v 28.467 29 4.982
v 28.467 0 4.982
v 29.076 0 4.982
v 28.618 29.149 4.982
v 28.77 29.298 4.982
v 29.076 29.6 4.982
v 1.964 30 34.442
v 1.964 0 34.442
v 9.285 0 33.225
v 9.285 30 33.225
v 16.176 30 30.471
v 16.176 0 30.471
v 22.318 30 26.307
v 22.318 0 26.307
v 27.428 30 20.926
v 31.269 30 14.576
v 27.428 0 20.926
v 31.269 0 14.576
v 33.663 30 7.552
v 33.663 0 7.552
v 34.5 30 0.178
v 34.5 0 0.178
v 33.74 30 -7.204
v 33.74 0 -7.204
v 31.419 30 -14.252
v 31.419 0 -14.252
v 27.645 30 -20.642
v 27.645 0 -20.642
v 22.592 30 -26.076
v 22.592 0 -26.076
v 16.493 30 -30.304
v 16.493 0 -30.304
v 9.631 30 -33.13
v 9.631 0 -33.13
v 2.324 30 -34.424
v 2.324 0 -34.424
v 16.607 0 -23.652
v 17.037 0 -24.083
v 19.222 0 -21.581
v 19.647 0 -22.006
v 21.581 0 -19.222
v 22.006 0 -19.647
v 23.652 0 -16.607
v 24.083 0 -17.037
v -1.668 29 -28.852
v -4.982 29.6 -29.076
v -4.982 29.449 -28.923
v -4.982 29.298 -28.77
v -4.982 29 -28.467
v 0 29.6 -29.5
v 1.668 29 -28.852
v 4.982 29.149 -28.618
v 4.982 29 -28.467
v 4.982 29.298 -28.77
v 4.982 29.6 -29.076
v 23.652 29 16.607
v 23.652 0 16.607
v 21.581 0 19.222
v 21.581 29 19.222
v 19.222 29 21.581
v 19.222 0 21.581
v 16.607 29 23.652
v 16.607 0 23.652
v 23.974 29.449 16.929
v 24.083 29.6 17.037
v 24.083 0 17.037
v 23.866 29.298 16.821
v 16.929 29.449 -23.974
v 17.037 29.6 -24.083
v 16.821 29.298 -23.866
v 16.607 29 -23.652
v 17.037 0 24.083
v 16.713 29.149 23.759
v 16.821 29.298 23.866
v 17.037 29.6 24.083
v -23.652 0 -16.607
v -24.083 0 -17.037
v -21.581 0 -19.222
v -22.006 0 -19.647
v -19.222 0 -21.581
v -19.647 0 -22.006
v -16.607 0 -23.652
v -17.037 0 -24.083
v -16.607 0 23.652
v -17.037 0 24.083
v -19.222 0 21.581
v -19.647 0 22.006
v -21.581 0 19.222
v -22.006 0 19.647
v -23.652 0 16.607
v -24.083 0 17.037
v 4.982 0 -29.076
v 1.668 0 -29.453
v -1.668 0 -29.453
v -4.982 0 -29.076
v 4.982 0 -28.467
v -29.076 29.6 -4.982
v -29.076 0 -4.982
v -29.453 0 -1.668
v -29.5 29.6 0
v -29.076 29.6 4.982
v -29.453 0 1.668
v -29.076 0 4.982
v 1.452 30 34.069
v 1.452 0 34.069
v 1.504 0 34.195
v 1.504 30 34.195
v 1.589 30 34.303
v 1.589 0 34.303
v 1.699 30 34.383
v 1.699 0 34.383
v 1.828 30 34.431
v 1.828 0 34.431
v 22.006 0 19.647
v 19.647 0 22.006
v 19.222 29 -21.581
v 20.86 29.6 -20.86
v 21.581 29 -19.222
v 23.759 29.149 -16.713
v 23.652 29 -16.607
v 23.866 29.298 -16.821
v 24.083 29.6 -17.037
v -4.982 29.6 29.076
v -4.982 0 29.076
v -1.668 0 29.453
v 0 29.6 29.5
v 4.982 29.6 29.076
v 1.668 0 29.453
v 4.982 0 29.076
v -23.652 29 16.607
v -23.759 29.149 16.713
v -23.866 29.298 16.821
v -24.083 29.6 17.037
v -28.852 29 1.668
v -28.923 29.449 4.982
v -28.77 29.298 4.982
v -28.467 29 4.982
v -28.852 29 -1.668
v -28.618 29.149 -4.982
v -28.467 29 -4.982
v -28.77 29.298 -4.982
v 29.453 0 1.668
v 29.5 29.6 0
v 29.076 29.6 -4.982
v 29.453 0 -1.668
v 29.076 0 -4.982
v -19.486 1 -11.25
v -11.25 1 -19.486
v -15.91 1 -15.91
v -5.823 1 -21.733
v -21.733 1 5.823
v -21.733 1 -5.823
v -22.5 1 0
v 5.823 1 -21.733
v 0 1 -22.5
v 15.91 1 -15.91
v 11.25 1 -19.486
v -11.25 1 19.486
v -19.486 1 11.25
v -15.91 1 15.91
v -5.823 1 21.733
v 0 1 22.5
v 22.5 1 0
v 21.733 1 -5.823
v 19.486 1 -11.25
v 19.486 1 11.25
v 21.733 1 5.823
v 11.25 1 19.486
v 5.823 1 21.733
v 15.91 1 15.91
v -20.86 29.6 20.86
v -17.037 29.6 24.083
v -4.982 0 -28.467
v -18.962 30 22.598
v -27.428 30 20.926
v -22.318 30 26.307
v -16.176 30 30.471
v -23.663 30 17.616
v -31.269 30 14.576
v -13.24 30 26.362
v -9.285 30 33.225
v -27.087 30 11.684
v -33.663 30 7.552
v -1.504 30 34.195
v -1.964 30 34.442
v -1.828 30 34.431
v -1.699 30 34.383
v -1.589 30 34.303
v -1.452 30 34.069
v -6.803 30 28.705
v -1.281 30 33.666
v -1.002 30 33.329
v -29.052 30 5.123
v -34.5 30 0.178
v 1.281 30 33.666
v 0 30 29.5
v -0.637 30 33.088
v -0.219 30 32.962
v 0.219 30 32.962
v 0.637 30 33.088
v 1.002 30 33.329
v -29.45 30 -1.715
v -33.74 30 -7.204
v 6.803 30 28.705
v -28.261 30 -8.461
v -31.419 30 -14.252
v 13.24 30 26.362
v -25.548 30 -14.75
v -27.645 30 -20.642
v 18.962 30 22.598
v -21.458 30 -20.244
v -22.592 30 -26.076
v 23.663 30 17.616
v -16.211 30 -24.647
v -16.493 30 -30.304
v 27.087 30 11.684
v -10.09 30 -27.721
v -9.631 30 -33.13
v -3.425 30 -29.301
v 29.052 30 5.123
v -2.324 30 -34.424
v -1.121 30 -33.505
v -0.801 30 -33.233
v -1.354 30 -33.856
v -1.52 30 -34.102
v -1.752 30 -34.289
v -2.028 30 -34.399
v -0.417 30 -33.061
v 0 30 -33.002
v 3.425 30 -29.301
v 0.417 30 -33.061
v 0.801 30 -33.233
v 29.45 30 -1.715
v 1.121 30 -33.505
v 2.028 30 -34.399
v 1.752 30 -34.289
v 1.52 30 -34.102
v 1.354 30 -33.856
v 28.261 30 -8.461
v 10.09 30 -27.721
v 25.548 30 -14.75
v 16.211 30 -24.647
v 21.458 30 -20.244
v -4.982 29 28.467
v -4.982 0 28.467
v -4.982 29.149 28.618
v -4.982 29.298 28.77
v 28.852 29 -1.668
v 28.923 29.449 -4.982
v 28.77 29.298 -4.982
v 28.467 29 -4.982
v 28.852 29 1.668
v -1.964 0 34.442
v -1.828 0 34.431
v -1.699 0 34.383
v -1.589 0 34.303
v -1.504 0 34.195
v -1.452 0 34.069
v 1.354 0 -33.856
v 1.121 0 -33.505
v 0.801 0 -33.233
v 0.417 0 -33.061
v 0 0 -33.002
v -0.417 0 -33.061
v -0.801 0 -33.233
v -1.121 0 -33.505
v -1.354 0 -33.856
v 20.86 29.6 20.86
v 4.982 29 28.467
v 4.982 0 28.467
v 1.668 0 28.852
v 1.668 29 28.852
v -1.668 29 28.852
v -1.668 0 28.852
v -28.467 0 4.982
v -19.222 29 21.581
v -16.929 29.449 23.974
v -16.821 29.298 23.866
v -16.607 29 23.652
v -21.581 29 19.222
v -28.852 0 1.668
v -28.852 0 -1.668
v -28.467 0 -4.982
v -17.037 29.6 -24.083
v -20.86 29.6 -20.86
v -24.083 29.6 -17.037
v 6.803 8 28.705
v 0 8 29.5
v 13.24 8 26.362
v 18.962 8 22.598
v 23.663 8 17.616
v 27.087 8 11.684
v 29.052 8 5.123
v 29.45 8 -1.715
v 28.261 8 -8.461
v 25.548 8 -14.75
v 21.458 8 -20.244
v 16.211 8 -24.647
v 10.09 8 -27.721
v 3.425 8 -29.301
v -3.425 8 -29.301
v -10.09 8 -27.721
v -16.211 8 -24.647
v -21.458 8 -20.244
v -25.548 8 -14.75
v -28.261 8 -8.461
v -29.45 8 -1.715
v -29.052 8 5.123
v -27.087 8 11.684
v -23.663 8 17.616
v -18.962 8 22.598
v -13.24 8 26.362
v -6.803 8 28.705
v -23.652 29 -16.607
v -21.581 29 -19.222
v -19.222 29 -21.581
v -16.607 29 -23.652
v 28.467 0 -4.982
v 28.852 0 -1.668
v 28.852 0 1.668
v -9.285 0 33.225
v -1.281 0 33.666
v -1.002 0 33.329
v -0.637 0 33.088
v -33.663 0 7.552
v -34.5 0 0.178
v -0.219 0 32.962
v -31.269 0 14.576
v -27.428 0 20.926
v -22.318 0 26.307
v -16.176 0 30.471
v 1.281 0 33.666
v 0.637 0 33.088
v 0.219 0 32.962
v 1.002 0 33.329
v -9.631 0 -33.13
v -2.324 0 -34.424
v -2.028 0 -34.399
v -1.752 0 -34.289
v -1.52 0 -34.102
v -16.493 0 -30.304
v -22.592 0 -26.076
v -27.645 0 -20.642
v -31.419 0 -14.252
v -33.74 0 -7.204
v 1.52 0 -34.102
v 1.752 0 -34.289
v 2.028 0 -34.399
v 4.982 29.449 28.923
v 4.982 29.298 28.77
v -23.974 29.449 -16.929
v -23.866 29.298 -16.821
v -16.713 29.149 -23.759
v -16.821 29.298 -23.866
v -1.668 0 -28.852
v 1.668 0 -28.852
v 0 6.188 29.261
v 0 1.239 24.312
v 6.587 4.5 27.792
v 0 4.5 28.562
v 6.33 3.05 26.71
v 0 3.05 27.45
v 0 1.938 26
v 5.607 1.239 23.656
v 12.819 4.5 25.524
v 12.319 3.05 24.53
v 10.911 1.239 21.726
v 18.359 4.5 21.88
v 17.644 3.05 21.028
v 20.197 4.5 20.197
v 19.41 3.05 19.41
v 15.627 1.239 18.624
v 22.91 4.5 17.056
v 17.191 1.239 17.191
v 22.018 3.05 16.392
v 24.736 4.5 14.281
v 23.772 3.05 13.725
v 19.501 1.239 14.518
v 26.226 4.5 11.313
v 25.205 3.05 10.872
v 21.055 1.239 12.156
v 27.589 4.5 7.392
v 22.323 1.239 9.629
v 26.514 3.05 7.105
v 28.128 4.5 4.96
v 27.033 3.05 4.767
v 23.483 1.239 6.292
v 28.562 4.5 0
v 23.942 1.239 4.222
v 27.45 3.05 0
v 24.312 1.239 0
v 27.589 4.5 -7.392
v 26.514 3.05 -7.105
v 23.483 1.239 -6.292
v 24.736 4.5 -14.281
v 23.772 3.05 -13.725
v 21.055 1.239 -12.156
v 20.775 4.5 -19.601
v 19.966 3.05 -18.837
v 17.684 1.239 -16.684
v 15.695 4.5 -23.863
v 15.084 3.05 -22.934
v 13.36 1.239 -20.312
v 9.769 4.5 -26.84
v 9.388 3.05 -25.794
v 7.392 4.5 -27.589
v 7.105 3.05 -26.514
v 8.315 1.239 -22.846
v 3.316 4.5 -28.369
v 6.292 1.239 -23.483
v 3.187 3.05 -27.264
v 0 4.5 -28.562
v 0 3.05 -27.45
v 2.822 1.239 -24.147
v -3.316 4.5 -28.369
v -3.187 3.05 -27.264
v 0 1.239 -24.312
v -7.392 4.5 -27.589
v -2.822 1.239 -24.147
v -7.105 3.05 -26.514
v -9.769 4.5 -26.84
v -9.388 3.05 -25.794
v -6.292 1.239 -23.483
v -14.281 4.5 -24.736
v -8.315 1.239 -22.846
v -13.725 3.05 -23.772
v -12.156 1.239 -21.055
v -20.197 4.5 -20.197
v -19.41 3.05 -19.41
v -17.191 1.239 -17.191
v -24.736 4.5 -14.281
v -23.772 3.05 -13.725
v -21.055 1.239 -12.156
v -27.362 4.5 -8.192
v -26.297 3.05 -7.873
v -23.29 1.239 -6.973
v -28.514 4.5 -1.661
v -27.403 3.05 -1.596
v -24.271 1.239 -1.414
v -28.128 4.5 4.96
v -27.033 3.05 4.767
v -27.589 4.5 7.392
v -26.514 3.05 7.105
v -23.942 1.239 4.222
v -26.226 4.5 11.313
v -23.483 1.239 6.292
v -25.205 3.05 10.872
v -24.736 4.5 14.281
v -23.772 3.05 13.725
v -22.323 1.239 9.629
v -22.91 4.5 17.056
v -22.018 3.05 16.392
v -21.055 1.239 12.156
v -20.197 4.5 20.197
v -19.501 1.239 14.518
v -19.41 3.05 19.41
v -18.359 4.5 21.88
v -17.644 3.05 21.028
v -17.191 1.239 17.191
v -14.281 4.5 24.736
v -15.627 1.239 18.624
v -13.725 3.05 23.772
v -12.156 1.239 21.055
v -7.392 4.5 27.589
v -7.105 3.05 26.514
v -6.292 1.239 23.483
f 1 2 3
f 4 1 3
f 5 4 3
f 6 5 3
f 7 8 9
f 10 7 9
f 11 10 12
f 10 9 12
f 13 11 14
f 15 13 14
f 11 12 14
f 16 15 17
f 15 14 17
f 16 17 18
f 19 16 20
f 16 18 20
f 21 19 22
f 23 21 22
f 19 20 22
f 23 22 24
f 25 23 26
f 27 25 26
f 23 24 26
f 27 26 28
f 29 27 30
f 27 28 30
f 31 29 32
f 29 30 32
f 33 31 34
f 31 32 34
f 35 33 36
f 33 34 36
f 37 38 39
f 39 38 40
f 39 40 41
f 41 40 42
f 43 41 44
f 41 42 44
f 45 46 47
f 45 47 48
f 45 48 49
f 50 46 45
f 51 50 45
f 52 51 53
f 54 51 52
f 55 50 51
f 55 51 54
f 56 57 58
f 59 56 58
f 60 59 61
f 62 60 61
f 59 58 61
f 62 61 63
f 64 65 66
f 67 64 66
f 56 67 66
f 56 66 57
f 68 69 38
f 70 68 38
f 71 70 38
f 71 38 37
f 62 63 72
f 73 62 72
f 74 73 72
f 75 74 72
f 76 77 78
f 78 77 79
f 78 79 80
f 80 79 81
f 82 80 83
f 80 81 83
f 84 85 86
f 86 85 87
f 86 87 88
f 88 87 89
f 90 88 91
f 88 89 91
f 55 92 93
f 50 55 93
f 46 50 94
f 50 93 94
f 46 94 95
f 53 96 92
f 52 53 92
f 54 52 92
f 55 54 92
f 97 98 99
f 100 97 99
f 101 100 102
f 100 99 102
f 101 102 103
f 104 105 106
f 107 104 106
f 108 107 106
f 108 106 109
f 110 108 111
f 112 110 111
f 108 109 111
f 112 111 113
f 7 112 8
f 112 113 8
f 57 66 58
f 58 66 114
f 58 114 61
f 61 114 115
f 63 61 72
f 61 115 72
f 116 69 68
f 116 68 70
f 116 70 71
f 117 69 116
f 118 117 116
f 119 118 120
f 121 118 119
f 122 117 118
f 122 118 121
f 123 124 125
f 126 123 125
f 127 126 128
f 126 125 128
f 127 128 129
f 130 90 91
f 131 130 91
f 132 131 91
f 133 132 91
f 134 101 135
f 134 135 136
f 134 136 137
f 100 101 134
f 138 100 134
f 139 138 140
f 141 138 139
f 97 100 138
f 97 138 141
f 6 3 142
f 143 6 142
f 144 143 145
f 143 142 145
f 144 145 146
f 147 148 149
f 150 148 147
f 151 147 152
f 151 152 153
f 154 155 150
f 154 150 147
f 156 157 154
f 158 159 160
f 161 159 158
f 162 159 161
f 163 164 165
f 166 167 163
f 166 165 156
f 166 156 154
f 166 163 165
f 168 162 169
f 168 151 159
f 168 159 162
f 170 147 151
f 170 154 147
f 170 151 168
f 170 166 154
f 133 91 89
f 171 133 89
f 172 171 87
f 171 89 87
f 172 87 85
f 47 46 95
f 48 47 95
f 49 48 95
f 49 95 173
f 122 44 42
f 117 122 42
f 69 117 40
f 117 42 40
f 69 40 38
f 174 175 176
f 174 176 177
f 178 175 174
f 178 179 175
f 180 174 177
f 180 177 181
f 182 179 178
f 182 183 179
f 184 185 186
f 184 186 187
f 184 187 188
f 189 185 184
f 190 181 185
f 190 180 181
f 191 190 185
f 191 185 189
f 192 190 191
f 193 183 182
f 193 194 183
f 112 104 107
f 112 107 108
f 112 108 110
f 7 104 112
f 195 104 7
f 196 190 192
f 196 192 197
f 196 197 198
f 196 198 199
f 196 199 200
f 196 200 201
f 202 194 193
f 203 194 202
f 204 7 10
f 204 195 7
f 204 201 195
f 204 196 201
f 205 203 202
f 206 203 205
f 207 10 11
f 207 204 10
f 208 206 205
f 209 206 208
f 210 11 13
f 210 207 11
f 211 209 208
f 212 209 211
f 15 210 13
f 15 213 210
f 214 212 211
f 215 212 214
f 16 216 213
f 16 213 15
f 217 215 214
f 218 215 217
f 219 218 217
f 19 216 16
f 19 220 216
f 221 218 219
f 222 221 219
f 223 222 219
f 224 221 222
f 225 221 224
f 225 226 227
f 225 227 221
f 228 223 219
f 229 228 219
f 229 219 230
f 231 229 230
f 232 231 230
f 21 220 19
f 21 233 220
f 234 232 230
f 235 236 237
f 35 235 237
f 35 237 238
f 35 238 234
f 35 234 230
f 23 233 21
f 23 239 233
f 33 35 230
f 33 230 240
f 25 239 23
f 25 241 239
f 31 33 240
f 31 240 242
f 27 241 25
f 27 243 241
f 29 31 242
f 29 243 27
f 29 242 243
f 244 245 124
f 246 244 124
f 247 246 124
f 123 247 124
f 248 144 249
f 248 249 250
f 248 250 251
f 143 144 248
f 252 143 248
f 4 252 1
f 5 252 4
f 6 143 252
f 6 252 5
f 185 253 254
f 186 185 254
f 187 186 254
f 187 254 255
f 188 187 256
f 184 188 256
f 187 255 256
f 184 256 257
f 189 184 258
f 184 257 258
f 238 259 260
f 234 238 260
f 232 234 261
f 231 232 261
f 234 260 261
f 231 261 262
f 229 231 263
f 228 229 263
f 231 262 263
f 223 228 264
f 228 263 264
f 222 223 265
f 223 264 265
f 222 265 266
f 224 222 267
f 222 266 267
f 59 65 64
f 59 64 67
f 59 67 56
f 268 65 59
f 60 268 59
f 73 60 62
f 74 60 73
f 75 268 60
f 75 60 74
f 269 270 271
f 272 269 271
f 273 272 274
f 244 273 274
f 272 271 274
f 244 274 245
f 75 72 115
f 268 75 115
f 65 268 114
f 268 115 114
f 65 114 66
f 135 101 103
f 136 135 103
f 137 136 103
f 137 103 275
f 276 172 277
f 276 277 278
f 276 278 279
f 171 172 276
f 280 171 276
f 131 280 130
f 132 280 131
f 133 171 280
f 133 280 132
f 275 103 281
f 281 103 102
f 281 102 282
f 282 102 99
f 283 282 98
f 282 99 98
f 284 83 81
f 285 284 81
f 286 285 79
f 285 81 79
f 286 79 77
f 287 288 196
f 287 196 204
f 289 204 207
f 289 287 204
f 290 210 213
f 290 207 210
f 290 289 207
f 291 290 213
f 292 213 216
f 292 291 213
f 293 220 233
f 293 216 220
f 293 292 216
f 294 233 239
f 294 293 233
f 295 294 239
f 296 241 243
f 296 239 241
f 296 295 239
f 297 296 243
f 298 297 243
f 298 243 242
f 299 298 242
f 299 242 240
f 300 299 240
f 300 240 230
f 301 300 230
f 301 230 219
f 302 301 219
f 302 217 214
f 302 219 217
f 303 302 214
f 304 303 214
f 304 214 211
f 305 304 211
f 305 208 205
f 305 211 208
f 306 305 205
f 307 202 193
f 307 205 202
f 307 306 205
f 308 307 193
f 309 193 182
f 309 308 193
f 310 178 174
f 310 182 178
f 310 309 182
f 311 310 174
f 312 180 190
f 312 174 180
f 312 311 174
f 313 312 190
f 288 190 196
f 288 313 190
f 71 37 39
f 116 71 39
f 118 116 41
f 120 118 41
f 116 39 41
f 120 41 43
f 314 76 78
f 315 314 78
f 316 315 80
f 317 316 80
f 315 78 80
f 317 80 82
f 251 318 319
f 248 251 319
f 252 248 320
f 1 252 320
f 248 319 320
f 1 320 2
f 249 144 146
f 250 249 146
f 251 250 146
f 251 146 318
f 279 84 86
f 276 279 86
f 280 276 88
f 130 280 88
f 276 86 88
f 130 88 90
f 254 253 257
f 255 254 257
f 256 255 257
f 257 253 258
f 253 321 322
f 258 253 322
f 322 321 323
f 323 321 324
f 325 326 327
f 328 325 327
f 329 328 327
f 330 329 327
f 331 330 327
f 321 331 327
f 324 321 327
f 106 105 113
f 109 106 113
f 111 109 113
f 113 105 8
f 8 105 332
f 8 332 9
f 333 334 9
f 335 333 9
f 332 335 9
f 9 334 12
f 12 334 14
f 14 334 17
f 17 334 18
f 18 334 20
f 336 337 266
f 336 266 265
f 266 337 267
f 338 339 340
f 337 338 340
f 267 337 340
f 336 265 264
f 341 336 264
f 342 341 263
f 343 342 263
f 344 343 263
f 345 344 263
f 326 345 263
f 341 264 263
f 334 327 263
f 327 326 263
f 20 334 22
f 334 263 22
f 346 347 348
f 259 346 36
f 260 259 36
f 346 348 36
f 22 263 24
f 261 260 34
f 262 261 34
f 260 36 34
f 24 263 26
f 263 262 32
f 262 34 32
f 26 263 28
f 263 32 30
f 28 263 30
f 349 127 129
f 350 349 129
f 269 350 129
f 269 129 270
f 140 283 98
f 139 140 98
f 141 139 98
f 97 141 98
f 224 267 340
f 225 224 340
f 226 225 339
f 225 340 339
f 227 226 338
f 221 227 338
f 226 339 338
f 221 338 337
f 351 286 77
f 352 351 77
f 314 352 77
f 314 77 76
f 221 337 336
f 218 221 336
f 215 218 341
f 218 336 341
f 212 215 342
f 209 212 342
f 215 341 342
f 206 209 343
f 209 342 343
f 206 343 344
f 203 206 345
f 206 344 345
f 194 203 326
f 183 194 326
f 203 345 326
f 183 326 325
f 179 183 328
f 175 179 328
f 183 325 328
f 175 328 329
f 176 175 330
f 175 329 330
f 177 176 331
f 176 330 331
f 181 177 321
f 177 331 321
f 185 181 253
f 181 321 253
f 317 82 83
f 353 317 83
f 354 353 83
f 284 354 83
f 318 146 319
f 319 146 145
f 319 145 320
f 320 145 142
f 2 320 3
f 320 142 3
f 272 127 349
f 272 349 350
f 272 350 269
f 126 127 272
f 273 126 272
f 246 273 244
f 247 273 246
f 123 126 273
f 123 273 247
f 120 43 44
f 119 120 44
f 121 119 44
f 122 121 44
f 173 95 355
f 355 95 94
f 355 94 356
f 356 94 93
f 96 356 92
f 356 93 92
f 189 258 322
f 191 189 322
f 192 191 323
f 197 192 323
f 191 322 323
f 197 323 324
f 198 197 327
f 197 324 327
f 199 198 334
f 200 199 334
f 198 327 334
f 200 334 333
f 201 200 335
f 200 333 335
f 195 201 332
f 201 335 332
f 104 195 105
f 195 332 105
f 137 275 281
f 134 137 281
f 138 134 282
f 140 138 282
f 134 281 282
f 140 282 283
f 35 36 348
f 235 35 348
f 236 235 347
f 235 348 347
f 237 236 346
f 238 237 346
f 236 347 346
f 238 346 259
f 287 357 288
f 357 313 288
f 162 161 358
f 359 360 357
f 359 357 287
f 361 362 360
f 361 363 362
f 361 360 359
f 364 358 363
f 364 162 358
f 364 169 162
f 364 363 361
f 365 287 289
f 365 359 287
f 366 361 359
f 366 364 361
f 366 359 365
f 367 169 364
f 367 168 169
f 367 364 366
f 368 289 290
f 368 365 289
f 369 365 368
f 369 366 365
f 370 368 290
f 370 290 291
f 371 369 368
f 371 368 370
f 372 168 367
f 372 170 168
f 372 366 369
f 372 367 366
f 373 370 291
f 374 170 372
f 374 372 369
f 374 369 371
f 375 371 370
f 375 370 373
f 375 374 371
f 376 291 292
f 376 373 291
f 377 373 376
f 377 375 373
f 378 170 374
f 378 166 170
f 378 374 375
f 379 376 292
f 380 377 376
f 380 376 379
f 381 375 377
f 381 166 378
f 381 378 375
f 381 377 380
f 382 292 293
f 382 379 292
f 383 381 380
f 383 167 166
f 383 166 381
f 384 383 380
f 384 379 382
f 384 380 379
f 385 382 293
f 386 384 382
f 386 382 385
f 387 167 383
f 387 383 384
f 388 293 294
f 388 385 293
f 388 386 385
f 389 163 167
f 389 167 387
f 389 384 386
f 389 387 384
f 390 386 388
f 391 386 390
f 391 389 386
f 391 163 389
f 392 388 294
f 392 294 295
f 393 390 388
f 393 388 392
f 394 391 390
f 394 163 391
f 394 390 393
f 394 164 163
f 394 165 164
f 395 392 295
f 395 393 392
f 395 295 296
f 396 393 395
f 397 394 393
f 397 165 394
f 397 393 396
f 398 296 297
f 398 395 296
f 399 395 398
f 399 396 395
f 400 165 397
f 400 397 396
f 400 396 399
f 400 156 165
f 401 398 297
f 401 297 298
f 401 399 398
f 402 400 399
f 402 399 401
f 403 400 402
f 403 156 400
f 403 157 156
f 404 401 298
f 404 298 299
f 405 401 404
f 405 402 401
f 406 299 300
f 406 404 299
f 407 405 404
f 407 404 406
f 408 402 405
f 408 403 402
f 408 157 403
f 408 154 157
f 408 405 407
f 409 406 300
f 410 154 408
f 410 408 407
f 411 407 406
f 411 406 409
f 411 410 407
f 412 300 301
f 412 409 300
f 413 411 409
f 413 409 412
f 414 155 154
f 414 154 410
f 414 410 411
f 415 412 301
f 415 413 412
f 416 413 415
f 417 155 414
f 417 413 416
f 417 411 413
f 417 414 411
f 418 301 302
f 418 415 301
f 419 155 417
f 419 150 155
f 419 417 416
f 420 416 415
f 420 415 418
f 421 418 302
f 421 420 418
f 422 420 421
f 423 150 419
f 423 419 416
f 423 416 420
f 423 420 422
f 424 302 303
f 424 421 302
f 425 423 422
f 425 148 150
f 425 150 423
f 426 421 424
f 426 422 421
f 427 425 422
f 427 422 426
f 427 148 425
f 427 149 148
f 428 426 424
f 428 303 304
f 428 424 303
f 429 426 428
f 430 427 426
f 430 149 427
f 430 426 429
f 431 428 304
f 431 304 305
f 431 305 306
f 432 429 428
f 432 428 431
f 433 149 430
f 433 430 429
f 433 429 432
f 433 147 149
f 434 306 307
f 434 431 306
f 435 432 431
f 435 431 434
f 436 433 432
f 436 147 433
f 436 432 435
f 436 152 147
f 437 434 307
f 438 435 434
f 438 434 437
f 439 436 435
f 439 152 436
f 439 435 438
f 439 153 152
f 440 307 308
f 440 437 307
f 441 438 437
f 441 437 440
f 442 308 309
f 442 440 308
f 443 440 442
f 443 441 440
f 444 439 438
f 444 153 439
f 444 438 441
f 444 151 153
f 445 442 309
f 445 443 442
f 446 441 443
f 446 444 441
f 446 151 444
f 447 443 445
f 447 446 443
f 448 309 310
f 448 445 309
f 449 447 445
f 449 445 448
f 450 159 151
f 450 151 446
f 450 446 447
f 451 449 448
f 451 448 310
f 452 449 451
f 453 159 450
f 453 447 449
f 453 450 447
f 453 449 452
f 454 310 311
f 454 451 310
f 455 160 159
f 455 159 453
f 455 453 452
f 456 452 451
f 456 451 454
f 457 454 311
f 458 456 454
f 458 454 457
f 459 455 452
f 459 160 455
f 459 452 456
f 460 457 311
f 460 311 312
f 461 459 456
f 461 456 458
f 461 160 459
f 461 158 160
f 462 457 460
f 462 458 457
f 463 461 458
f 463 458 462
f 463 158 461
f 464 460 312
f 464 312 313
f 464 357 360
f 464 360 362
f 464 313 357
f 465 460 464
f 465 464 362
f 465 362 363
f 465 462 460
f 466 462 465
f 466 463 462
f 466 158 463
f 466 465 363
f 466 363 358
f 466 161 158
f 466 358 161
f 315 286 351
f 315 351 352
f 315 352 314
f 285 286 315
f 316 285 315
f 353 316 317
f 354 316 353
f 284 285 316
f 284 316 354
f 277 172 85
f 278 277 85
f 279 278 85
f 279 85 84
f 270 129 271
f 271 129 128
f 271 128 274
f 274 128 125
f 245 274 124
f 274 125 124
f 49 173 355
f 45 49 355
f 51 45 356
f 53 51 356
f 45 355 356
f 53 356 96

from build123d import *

# Parameters (mm, degrees)
BOSS_EXTRUDE1_DEPTH = 30
CUT_EXTRUDE2_REACH  = 60.241
CUT_EXTRUDE2_START  = 1
SKETCH2_R           = 29.5
BOSS_EXTRUDE2_DEPTH = 30
CHAMFER2_SIZE       = 1
CIRPATTERN2_COUNT   = 8
FILLET2_R           = 7


with BuildPart() as part:
    # Sketch1 → Boss-Extrude1 (new body)
    with BuildSketch(Plane(origin=(0, 0, 0), x_dir=(1, 0, 0), z_dir=(0, 1, 0))):
        with BuildLine():
            ThreePointArc((1.451818925, -34.068556857), (1.641248992, -34.346908706), (1.964225605, -34.442038138))
            ThreePointArc((1.964225605, -34.442038138), (34.499528846, -0.178302888), (2.324135821, 34.423627607))
            ThreePointArc((2.324135821, 34.423627607), (1.751838249, 34.289058819), (1.354061739, 33.856153382))
            ThreePointArc((1.354061739, 33.856153382), (0, 33.001534515), (-1.354061739, 33.856153382))
            ThreePointArc((-1.354061739, 33.856153382), (-1.751838249, 34.289058819), (-2.324135821, 34.423627607))
            ThreePointArc((-2.324135821, 34.423627607), (-34.499528846, -0.178302888), (-1.964225605, -34.442038138))
            ThreePointArc((-1.964225605, -34.442038138), (-1.641248992, -34.346908706), (-1.451818925, -34.068556857))
            ThreePointArc((-1.451818925, -34.068556857), (0, -32.945679925), (1.451818925, -34.068556857))
        make_face()
    extrude(amount=BOSS_EXTRUDE1_DEPTH)

    # Sketch2 → Cut-Extrude2 (cut, up to next)
    with BuildSketch(Plane(origin=(0, 0, 0), x_dir=(1, 0, 0), z_dir=(0, 1, 0)).offset(CUT_EXTRUDE2_START), mode=Mode.PRIVATE) as cut_extrude2_sk1:
        with Locations(Location((0, 0, 0), (0, 0, 270))):
            Circle(SKETCH2_R)
    cut_extrude2_tool1 = extrude(cut_extrude2_sk1.sketch, amount=CUT_EXTRUDE2_REACH, mode=Mode.PRIVATE) & part.part
    add(cut_extrude2_tool1.solids().sort_by_distance((0, 1, 0))[0], mode=Mode.SUBTRACT)

    # Fillet2
    fillet2_edges = [part.edges().sort_by_distance(p)[0] for p in [
        (0, 1, -29.5),
    ]]
    fillet(fillet2_edges, radius=FILLET2_R)


with BuildPart() as body_2:
    # Sketch2<2> → Boss-Extrude2 (new body)
    with BuildSketch(Plane(origin=(0, 0, 0), x_dir=(1, 0, 0), z_dir=(0, 1, 0))):
        with BuildLine():
            ThreePointArc((4.982013036, 29.076271186), (0, 29.5), (-4.982013036, 29.076271186))
            Line((-4.982013036, 29.076271186), (-4.982013036, 28.467341746))
            ThreePointArc((-4.982013036, 28.467341746), (0, 28.9), (4.982013036, 28.467341746))
            Line((4.982013036, 28.467341746), (4.982013036, 29.076271186))
        make_face()
    extrude(amount=BOSS_EXTRUDE2_DEPTH)

    # Chamfer2
    # the kernel refuses this chamfer: 1 mm, written as the material it takes off along each edge
    with BuildSketch(Plane(origin=(0, 30, 0), x_dir=(-0.25924534785409165, 0, -0.9658114979725655), z_dir=(-0.9658114979725655, 0, 0.25924534785409165))) as chamfer2_piece_1:
        Polygon((28.9, CHAMFER2_SIZE), (28.9 + CHAMFER2_SIZE, 0), (28.9, 0), align=None)
    revolve(axis=Axis((0, 30, 0), (0, -1, 0)), revolution_arc=30.050576955, mode=Mode.SUBTRACT)


with BuildPart() as cirpattern2_1:
    # CirPattern2: pattern copy
    add(body_2.part.rotate(Axis((0, 0, 0), (0, 1, 0)), 1 * 360 / CIRPATTERN2_COUNT))


with BuildPart() as cirpattern2_2:
    # CirPattern2: pattern copy
    add(body_2.part.rotate(Axis((0, 0, 0), (0, 1, 0)), 2 * 360 / CIRPATTERN2_COUNT))


with BuildPart() as cirpattern2_3:
    # CirPattern2: pattern copy
    add(body_2.part.rotate(Axis((0, 0, 0), (0, 1, 0)), 3 * 360 / CIRPATTERN2_COUNT))


with BuildPart() as cirpattern2_4:
    # CirPattern2: pattern copy
    add(body_2.part.rotate(Axis((0, 0, 0), (0, 1, 0)), 4 * 360 / CIRPATTERN2_COUNT))


with BuildPart() as cirpattern2_5:
    # CirPattern2: pattern copy
    add(body_2.part.rotate(Axis((0, 0, 0), (0, 1, 0)), 5 * 360 / CIRPATTERN2_COUNT))


with BuildPart() as cirpattern2_6:
    # CirPattern2: pattern copy
    add(body_2.part.rotate(Axis((0, 0, 0), (0, 1, 0)), 6 * 360 / CIRPATTERN2_COUNT))


with BuildPart() as cirpattern2_7:
    # CirPattern2: pattern copy
    add(body_2.part.rotate(Axis((0, 0, 0), (0, 1, 0)), 7 * 360 / CIRPATTERN2_COUNT))


solid = Compound([part.part, body_2.part, cirpattern2_1.part, cirpattern2_2.part, cirpattern2_3.part, cirpattern2_4.part, cirpattern2_5.part, cirpattern2_6.part, cirpattern2_7.part])
